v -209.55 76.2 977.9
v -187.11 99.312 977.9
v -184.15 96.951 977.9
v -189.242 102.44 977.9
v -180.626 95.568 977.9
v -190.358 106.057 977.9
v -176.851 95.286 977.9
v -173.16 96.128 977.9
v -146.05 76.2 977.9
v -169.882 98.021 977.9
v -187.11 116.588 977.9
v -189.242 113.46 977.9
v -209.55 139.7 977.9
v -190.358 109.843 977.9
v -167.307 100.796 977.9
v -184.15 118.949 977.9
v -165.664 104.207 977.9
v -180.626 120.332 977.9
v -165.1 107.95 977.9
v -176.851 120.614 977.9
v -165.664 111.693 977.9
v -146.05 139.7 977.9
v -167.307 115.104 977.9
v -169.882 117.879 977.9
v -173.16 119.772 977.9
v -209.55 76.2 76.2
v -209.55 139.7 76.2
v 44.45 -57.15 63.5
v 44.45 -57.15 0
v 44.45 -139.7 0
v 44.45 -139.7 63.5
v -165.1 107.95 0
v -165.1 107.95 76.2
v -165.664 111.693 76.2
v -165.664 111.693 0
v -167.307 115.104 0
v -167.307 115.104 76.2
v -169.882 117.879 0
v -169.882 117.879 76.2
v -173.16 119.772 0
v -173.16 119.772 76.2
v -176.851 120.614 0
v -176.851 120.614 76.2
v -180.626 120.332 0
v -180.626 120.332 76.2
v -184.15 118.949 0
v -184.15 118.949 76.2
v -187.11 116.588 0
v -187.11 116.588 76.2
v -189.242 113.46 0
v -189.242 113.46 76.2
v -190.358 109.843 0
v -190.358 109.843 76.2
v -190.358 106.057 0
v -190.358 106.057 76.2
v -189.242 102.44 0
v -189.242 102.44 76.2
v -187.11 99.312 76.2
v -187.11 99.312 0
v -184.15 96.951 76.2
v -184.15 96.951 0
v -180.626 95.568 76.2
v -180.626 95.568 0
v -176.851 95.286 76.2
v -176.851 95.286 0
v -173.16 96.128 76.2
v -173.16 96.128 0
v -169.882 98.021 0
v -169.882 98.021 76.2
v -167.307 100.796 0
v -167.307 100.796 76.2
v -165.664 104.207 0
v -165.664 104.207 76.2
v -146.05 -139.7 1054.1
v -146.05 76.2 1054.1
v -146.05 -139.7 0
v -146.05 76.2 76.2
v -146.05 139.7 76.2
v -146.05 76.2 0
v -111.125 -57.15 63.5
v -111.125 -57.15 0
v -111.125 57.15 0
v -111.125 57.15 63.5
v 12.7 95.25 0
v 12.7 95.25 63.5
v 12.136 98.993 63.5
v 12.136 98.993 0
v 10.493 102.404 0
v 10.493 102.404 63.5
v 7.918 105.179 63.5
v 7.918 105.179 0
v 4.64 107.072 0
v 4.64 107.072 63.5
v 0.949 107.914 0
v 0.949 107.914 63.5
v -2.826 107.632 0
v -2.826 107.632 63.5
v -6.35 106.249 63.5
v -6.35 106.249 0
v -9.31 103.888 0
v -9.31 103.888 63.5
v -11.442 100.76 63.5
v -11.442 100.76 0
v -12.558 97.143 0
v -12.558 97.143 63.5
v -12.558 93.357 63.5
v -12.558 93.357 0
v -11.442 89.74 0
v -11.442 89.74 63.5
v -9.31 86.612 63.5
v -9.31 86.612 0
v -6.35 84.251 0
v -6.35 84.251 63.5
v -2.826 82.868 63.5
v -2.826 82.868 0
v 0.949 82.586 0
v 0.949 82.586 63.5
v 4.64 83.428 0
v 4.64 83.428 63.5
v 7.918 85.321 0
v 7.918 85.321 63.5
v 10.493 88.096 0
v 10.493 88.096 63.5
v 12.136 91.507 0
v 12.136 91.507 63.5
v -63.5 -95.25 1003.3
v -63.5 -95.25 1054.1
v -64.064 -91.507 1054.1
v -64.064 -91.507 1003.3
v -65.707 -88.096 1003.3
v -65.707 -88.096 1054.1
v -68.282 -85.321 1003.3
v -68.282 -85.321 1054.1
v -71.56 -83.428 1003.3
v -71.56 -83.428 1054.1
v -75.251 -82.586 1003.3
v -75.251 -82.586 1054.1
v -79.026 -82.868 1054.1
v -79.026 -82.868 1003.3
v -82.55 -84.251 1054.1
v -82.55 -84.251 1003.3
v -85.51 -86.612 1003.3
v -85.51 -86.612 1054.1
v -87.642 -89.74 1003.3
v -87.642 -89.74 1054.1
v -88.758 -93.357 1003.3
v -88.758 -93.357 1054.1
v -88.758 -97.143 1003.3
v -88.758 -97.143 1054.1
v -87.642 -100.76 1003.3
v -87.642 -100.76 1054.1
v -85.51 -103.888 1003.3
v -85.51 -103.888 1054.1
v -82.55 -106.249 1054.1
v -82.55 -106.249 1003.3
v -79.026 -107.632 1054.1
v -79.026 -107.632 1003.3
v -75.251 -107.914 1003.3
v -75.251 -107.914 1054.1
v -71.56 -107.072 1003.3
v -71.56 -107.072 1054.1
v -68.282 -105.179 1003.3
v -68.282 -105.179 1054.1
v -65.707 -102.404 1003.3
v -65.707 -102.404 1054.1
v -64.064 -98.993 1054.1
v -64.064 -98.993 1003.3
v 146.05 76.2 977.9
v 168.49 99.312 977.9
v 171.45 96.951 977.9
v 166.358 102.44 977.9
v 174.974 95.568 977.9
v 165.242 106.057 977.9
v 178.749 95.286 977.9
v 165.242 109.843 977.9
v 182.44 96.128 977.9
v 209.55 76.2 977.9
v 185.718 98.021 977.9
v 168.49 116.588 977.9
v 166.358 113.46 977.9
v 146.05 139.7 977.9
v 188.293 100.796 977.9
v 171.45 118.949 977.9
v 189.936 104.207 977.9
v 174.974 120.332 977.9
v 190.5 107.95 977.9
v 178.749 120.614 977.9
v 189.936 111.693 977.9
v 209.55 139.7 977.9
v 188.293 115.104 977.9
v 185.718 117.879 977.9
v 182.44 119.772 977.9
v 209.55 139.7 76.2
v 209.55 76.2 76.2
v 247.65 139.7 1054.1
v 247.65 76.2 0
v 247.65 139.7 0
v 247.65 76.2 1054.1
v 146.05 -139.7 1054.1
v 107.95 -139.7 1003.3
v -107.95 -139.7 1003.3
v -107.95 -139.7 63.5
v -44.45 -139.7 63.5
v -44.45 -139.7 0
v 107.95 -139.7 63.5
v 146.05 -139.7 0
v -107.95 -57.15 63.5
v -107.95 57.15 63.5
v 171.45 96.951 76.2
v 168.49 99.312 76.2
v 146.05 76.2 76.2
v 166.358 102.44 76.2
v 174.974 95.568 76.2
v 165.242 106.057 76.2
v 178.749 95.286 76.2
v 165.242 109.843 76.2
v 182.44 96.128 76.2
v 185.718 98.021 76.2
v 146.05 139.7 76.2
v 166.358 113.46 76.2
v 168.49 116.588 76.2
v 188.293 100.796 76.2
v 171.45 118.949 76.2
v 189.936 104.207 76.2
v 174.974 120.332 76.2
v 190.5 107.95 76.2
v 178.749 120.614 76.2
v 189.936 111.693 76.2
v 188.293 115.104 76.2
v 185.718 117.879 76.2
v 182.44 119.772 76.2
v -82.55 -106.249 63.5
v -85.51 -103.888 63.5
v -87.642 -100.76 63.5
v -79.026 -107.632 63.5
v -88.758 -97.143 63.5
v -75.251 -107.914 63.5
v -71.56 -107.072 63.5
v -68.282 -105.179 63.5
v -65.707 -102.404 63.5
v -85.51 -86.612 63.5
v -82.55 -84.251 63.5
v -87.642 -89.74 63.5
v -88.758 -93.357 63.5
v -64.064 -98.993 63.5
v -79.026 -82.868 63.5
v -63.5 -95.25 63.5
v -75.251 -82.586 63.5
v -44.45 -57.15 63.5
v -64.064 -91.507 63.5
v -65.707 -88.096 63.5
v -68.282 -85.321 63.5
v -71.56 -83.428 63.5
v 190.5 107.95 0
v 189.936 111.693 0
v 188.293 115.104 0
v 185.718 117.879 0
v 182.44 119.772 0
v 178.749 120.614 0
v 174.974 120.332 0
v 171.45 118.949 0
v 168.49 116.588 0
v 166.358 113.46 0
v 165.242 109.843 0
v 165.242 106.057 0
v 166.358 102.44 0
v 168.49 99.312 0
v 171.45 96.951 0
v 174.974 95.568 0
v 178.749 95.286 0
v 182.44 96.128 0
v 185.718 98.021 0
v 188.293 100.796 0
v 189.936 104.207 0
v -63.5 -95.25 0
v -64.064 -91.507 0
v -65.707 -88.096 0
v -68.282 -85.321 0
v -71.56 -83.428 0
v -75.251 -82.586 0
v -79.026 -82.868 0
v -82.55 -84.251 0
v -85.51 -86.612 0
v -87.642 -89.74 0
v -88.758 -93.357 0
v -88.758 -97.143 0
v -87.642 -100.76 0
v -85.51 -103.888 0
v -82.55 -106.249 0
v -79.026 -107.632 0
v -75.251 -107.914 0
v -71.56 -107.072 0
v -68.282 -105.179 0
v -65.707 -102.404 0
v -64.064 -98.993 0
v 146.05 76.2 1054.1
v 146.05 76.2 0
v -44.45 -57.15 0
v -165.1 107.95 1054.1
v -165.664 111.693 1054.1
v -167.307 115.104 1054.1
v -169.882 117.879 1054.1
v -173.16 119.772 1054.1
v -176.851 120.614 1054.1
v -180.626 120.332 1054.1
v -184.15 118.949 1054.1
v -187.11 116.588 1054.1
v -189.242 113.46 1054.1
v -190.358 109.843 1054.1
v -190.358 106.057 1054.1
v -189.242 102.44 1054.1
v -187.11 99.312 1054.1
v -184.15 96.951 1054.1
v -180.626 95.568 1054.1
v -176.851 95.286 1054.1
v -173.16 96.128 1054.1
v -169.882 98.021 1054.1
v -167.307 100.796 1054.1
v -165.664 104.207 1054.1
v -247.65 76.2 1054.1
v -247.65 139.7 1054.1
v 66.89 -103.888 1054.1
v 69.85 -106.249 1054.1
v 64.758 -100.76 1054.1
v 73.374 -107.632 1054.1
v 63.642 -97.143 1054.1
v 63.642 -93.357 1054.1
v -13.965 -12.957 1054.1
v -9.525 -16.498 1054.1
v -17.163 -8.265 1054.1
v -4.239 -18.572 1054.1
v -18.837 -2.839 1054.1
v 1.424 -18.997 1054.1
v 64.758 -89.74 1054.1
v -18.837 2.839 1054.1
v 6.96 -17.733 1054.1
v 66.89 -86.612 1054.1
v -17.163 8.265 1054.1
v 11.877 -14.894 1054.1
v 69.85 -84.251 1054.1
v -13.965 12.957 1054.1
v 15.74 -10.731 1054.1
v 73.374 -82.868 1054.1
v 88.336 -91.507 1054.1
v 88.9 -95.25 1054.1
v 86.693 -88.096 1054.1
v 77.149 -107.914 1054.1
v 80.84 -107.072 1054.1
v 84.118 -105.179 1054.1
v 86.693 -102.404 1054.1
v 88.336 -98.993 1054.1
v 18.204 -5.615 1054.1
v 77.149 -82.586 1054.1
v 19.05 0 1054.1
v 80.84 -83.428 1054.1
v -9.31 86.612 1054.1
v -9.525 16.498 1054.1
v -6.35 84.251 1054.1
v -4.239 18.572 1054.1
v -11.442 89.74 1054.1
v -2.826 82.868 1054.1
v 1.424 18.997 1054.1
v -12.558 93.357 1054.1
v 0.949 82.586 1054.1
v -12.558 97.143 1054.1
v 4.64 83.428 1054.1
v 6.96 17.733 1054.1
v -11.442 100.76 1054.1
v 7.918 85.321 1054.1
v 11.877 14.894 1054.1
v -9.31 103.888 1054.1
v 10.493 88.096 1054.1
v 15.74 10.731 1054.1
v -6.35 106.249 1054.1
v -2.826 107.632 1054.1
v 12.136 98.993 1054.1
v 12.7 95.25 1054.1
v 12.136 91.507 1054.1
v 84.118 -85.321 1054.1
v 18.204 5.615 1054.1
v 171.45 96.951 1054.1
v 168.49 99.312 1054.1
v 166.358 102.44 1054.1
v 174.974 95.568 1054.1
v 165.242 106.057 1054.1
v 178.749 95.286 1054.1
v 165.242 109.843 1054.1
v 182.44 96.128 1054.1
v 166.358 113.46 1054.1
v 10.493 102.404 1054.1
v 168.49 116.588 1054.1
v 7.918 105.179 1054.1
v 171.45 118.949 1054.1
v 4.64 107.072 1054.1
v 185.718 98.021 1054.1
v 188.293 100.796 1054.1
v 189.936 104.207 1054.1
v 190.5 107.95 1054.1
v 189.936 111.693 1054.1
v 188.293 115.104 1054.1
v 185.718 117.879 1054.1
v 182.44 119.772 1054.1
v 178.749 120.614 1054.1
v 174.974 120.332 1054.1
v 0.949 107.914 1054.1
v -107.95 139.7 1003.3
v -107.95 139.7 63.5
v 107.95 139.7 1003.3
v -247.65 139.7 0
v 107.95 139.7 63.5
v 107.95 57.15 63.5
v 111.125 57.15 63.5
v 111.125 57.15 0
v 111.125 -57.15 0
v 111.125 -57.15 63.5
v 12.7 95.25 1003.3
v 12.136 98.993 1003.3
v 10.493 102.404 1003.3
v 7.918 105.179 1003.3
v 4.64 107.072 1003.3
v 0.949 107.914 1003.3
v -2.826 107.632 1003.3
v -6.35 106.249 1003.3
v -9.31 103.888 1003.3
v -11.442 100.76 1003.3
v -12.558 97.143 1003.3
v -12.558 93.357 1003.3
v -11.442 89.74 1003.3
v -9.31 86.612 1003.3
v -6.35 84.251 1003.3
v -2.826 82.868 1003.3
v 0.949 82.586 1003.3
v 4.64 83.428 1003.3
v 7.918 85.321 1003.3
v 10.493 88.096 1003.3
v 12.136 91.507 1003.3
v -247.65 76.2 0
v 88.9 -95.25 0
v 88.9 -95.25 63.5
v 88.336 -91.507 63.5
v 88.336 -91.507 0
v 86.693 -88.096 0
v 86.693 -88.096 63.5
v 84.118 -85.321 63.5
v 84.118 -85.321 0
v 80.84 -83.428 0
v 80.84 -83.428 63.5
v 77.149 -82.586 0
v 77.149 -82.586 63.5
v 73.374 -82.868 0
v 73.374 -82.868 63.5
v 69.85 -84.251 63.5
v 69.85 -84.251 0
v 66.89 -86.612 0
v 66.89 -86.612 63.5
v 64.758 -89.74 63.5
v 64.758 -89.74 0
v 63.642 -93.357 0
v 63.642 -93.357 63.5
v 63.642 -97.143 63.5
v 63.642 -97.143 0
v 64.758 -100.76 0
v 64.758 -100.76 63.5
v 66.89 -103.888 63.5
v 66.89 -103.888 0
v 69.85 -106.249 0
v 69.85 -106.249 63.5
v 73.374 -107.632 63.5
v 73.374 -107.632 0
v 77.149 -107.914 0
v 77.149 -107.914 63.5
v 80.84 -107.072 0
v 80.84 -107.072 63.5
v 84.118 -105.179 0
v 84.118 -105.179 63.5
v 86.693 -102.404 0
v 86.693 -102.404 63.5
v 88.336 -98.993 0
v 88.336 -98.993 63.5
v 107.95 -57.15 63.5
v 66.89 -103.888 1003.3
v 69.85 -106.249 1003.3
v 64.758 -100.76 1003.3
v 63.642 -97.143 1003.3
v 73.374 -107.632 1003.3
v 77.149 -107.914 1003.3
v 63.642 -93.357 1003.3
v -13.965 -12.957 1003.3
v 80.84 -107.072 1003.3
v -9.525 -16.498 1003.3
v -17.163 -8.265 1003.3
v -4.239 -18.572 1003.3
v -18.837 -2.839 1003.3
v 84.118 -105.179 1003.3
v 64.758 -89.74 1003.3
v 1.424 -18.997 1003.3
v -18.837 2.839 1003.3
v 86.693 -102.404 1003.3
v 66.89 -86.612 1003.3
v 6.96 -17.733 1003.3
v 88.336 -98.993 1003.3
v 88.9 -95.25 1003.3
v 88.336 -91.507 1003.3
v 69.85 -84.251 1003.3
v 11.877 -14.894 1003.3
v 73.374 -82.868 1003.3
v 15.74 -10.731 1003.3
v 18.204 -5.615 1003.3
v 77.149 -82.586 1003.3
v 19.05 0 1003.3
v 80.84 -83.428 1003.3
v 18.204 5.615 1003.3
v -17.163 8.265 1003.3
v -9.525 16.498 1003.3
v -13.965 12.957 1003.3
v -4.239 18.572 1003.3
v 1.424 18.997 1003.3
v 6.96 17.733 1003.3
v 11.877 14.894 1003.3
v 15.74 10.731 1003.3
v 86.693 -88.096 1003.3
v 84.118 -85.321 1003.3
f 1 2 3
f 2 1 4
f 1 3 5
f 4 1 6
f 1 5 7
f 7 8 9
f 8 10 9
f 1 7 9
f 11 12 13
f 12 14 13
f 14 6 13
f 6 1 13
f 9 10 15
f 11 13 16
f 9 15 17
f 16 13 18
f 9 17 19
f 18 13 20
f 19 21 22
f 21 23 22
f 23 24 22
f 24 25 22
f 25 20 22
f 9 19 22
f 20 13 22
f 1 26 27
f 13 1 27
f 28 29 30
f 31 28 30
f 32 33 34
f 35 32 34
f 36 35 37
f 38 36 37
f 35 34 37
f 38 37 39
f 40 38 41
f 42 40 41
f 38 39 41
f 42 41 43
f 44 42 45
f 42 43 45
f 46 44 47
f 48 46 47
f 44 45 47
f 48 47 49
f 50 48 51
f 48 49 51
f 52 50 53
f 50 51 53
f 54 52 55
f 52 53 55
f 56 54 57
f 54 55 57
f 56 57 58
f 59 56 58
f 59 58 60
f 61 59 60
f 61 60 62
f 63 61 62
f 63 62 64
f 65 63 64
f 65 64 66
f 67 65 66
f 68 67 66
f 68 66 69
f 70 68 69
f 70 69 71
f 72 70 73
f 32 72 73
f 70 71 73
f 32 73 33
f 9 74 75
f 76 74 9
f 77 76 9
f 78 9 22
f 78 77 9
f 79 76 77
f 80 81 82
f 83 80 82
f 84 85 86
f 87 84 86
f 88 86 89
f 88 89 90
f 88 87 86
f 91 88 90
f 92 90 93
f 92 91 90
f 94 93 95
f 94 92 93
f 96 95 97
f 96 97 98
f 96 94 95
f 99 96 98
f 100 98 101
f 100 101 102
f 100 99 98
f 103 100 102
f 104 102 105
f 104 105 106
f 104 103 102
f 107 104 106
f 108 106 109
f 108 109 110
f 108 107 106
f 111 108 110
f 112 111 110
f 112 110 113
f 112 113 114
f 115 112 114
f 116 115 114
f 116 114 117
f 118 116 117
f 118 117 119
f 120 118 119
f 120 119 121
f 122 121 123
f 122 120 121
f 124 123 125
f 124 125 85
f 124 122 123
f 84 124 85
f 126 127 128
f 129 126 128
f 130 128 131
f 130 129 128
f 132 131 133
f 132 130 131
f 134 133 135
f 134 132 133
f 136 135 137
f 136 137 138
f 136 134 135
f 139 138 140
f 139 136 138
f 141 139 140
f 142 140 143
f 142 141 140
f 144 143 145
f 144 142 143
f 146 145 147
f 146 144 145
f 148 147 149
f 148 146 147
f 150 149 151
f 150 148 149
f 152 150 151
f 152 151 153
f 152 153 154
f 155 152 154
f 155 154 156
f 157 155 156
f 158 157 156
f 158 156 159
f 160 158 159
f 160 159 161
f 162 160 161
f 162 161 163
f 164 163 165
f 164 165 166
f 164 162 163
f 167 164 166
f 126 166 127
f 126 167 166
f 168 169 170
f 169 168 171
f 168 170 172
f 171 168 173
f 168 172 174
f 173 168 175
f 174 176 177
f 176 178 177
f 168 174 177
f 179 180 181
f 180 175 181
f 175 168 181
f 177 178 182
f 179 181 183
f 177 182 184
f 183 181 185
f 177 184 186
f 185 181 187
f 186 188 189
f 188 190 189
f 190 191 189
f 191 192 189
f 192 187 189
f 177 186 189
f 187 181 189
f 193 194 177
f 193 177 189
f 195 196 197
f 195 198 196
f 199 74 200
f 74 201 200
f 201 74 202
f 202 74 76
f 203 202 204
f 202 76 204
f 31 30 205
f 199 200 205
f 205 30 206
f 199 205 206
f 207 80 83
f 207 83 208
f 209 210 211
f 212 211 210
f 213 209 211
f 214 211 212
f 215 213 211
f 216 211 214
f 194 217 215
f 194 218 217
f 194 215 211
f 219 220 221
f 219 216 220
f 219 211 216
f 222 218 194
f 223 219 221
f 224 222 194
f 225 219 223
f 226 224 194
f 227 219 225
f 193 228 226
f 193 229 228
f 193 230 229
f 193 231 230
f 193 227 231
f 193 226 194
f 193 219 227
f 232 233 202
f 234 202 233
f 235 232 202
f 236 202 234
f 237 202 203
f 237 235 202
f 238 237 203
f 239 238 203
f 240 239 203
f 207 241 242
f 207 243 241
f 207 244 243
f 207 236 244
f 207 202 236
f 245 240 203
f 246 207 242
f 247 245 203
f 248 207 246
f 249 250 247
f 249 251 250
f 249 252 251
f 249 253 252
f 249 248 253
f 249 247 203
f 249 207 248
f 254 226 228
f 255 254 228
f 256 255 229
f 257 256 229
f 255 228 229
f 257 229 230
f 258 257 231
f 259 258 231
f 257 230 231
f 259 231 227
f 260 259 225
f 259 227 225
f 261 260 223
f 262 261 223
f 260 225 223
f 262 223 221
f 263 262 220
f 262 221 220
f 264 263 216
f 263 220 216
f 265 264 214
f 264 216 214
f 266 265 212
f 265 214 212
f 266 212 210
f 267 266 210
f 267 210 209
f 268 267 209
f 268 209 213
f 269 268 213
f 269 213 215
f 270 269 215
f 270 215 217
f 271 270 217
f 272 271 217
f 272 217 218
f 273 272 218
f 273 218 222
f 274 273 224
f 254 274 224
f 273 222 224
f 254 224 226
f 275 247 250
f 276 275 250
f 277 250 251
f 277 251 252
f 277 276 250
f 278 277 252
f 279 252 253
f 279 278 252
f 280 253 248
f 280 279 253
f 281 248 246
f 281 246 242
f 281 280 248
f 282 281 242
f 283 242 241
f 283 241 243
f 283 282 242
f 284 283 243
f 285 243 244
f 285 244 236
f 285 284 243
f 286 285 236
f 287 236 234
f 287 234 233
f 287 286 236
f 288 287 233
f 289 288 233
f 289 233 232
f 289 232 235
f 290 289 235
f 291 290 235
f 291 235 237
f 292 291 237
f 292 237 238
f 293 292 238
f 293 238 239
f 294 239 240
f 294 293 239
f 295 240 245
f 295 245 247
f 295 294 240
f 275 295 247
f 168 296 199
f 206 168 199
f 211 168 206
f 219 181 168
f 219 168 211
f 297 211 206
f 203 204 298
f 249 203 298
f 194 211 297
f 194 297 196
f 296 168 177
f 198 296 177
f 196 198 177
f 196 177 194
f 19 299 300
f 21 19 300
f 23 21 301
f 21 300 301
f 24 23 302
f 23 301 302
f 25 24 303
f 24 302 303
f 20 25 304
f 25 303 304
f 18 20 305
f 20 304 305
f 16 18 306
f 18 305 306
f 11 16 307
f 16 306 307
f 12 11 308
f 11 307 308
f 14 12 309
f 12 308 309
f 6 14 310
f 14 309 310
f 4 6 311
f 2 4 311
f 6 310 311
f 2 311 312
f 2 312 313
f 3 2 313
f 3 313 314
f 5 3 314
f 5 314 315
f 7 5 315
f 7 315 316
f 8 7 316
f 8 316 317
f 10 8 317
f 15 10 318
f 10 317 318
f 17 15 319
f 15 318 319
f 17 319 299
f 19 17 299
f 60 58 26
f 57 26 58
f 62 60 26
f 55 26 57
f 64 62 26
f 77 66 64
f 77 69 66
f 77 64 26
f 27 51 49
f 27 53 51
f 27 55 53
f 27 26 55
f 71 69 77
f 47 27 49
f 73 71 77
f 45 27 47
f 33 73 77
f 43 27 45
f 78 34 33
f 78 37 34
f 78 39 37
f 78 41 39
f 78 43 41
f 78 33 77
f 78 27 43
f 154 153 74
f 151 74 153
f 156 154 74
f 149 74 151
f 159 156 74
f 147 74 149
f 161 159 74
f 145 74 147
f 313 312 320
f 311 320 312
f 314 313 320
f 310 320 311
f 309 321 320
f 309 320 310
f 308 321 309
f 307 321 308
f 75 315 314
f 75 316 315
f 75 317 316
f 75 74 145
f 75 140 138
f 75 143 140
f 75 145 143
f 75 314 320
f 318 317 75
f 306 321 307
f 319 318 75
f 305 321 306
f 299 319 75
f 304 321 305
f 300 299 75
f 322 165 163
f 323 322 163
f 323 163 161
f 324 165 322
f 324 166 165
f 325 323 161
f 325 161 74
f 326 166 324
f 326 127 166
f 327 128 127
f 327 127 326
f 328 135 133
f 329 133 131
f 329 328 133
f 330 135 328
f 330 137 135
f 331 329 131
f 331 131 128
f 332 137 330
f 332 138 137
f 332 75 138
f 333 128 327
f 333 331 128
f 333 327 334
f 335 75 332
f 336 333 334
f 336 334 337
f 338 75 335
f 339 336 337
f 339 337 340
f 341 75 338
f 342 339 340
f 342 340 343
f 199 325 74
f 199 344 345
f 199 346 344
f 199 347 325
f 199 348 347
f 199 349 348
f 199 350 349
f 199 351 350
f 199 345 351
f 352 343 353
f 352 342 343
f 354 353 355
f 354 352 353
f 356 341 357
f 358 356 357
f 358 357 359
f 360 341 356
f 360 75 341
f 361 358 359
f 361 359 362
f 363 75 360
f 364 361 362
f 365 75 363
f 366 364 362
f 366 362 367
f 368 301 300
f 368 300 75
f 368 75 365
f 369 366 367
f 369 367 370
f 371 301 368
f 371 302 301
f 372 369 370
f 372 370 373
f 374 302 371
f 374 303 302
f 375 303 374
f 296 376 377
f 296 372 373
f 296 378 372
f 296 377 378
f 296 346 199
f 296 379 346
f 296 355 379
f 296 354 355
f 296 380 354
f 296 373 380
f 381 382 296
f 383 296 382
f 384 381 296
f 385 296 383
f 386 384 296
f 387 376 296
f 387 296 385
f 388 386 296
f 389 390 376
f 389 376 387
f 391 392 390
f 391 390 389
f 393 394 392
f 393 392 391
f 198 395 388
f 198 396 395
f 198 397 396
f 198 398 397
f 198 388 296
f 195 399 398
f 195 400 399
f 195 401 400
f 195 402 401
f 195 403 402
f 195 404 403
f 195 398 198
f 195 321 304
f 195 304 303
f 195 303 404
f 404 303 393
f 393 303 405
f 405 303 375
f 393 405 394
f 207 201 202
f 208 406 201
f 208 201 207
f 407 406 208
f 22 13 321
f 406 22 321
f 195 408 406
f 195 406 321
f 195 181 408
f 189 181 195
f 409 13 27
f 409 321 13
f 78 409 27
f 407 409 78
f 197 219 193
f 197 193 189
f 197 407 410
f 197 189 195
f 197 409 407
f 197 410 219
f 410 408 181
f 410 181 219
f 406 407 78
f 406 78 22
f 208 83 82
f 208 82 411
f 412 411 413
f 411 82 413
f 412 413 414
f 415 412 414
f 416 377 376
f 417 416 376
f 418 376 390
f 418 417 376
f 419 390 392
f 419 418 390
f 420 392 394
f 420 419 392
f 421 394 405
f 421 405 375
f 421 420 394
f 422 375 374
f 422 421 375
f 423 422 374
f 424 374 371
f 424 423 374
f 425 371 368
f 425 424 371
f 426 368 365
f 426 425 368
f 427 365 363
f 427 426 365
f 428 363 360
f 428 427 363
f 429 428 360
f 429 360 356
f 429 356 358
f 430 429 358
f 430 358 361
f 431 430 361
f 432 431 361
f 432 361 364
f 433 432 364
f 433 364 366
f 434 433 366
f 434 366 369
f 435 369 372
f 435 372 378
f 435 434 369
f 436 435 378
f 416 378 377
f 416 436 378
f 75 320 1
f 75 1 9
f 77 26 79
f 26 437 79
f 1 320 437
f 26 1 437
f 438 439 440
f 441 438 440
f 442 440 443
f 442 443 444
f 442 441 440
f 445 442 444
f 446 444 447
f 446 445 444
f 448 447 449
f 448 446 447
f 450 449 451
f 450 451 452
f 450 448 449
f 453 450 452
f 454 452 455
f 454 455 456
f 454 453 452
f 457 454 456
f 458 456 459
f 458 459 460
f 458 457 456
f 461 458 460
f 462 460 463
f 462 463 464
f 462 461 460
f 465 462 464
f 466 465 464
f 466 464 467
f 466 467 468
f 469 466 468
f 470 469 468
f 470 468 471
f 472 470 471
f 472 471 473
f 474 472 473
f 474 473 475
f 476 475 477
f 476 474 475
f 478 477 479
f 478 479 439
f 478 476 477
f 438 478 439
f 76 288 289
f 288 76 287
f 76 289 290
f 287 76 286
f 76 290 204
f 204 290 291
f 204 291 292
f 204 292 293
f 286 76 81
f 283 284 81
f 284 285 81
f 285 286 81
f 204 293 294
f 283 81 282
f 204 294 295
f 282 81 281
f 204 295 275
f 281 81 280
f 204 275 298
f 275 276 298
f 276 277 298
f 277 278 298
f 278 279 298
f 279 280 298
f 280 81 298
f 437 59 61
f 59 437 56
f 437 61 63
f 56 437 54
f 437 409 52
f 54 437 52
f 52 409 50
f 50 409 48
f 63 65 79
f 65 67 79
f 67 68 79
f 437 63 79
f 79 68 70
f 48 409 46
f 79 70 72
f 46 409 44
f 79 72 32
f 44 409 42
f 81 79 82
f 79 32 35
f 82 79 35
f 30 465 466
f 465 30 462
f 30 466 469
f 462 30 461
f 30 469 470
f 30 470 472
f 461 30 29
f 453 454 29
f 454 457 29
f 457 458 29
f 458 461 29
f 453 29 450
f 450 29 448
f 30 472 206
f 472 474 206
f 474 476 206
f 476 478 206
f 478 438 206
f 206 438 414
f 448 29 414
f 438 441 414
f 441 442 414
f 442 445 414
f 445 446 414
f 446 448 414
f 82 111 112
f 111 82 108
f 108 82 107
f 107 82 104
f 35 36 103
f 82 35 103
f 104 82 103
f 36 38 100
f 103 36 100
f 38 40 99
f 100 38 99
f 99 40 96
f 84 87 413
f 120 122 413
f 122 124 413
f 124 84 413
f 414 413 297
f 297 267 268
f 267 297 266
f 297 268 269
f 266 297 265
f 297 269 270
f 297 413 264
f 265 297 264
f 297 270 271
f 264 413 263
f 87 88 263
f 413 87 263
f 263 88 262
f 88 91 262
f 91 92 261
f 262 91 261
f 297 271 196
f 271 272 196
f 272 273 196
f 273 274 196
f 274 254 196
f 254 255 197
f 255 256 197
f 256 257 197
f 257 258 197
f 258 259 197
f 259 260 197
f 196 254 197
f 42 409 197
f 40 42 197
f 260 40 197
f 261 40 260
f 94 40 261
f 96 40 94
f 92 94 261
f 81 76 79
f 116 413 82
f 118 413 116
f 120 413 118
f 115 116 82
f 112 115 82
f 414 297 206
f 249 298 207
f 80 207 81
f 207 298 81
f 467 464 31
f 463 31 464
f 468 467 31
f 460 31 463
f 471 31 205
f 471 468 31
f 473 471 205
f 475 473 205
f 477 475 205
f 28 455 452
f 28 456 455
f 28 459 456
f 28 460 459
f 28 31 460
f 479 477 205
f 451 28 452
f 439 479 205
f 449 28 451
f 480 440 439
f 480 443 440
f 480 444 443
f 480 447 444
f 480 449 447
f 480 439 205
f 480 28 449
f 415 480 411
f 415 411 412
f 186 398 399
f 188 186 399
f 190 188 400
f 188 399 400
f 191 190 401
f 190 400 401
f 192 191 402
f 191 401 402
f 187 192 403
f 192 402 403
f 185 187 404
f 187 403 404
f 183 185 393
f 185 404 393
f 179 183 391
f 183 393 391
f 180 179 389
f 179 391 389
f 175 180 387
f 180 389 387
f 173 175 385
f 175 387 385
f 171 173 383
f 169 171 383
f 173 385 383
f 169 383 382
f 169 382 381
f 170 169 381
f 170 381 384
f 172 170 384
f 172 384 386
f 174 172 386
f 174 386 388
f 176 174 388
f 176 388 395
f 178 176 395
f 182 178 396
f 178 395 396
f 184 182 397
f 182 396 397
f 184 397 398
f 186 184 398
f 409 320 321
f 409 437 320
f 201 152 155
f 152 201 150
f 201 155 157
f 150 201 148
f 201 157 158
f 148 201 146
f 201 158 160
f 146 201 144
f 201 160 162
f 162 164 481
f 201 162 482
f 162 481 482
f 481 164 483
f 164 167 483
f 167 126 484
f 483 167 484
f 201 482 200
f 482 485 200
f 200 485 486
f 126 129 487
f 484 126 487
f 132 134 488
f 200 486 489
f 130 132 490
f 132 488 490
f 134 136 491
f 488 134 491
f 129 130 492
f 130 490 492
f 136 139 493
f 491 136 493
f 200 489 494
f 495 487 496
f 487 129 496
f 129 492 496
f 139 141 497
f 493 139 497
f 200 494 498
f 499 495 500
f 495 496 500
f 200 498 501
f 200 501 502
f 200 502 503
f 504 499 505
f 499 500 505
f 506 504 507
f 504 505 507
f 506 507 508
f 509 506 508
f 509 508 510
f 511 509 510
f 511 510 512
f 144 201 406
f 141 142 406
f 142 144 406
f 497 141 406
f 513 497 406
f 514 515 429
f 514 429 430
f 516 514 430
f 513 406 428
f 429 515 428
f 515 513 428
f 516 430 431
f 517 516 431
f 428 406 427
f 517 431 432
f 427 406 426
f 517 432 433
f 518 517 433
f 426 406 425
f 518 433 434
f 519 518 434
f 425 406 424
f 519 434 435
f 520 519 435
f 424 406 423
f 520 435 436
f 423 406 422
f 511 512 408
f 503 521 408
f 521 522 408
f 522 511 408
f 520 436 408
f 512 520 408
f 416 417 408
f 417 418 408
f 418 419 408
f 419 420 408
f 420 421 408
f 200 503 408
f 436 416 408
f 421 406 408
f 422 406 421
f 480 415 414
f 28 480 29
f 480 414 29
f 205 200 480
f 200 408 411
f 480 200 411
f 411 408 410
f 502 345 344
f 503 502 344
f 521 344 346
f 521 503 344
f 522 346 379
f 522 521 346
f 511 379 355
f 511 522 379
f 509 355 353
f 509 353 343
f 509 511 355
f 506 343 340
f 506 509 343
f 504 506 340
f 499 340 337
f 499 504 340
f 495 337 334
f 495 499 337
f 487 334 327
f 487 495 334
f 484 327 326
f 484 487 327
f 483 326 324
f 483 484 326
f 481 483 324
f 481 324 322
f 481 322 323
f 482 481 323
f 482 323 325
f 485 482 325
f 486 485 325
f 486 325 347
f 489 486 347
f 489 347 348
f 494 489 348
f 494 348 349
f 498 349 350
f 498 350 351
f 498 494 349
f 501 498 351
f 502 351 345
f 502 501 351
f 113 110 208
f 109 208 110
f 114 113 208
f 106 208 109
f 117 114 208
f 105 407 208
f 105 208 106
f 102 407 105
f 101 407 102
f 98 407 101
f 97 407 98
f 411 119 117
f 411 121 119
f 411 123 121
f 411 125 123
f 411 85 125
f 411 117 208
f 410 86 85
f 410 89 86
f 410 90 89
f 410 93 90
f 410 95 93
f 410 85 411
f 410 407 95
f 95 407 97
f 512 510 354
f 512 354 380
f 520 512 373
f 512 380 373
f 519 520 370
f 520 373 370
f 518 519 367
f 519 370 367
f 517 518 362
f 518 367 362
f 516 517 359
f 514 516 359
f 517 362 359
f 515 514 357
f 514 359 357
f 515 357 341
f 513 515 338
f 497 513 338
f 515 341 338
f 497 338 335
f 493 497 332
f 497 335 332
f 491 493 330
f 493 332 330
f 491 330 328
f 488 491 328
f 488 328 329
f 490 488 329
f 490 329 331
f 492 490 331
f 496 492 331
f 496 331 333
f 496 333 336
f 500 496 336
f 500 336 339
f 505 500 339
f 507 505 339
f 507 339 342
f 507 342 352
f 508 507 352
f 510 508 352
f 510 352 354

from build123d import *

# Parameters (mm, degrees)
SKETCH1_R           = 12.7
BOSS_EXTRUDE1_DEPTH = 63.5
BOSS_EXTRUDE2_REACH = 323.601
SKETCH2_W           = 38.1
SKETCH2_H           = 939.8
SKETCH3_W           = 38.1
SKETCH3_H           = 279.4
SKETCH3_W_2         = 215.9
SKETCH3_R           = 12.7
BOSS_EXTRUDE3_DEPTH = 50.8
CUT_EXTRUDE1_REACH  = 1075.3
SKETCH4_R           = 19.05
SKETCH5_W           = 38.1
SKETCH5_H           = 63.5
SKETCH5_W_2         = 63.5
SKETCH5_R           = 12.7
BOSS_EXTRUDE4_DEPTH = 76.2
BOSS_EXTRUDE5_START = -977.9
SKETCH5_3_W         = 38.1
SKETCH5_3_H         = 63.5
SKETCH5_3_W_2       = 63.5
SKETCH5_3_R         = 12.7
BOSS_EXTRUDE5_DEPTH = 76.2
BOSS_EXTRUDE6_START = -977.9
SKETCH5_4_W         = 38.1
SKETCH5_4_H         = 63.5
BOSS_EXTRUDE6_DEPTH = 901.7


with BuildPart() as part:
    # Sketch1 → Boss-Extrude1 (new body)
    with BuildSketch(Plane.XY):
        Polygon((146.05, 139.7), (-146.05, 139.7), (-146.05, -139.7), (-44.45, -139.7), (-44.45, -57.15), (-111.125, -57.15), (-111.125, 57.15), (111.125, 57.15), (111.125, -57.15), (44.45, -57.15), (44.45, -139.7), (146.05, -139.7), align=None)
        with Locations((-76.2, -95.25)):
            Circle(SKETCH1_R, mode=Mode.SUBTRACT)
        with Locations((76.2, -95.25)):
            Circle(SKETCH1_R, mode=Mode.SUBTRACT)
        with Locations((0, 95.25)):
            Circle(SKETCH1_R, mode=Mode.SUBTRACT)
    extrude(amount=BOSS_EXTRUDE1_DEPTH)

    # Boss-Extrude2: up to this face of the body (flat: up to its plane)
    boss_extrude2_end = Plane(part.part.faces().sort_by_distance((-95.25, -139.7, 31.75))[0])
    # Sketch2 → Boss-Extrude2 (add, up to the picked face)
    with BuildSketch(Plane(origin=(0, 139.7, 0), x_dir=(1, 0, 0), z_dir=(0, 1, 0)), mode=Mode.PRIVATE) as boss_extrude2_sk1:
        with Locations((-127, -533.4)):
            Rectangle(SKETCH2_W, SKETCH2_H)
    boss_extrude2_tool1 = split(extrude(boss_extrude2_sk1.sketch, amount=-BOSS_EXTRUDE2_REACH, mode=Mode.PRIVATE), bisect_by=boss_extrude2_end, keep=Keep.BOTH, mode=Mode.PRIVATE)
    # Sketch2 → Boss-Extrude2 (add, up to the picked face)
    with BuildSketch(Plane(origin=(0, 139.7, 0), x_dir=(1, 0, 0), z_dir=(0, 1, 0)), mode=Mode.PRIVATE) as boss_extrude2_sk2:
        with Locations((127, -533.4)):
            Rectangle(SKETCH2_W, SKETCH2_H)
    boss_extrude2_tool2 = split(extrude(boss_extrude2_sk2.sketch, amount=-BOSS_EXTRUDE2_REACH, mode=Mode.PRIVATE), bisect_by=boss_extrude2_end, keep=Keep.BOTH, mode=Mode.PRIVATE)
    add(boss_extrude2_tool1.solids().sort_by(Axis((-127, 139.7, 533.4), (0, -1, 0)))[0])
    add(boss_extrude2_tool2.solids().sort_by(Axis((127, 139.7, 533.4), (0, -1, 0)))[0])

    # Sketch3 → Boss-Extrude3 (add)
    # profile 1 of 3: a face of its own
    with BuildSketch(Plane.XY.offset(1003.3)):
        with Locations((-127, 0)):
            Rectangle(SKETCH3_W, SKETCH3_H)
    # profile 2 of 3: a face of its own
    with BuildSketch(Plane.XY.offset(1003.3)):
        Rectangle(SKETCH3_W_2, SKETCH3_H)
        with Locations((-76.2, -95.25)):
            Circle(SKETCH3_R, mode=Mode.SUBTRACT)
        with Locations((76.2, -95.25)):
            Circle(SKETCH3_R, mode=Mode.SUBTRACT)
        with Locations((0, 95.25)):
            Circle(SKETCH3_R, mode=Mode.SUBTRACT)
    # profile 3 of 3: a face of its own
    with BuildSketch(Plane.XY.offset(1003.3)):
        with Locations((127, 0)):
            Rectangle(SKETCH3_W, SKETCH3_H)
    extrude(amount=BOSS_EXTRUDE3_DEPTH)

    # Sketch4 → Cut-Extrude1 (cut, up to next)
    with BuildSketch(Plane.XY.offset(1054.1), mode=Mode.PRIVATE) as cut_extrude1_sk1:
        Circle(SKETCH4_R)
    cut_extrude1_tool1 = extrude(cut_extrude1_sk1.sketch, amount=-CUT_EXTRUDE1_REACH, mode=Mode.PRIVATE) & part.part
    add(cut_extrude1_tool1.solids().sort_by_distance((0, 0, 1054.1))[0], mode=Mode.SUBTRACT)

    # Sketch5 → Boss-Extrude4 (add)
    # profile 1 of 4: a face of its own
    with BuildSketch(Plane.XY.offset(1054.1)):
        with Locations((228.6, 107.95)):
            Rectangle(SKETCH5_W, SKETCH5_H)
    # profile 2 of 4: a face of its own
    with BuildSketch(Plane.XY.offset(1054.1)):
        with Locations((177.8, 107.95)):
            Rectangle(SKETCH5_W_2, SKETCH5_H)
        with Locations((177.8, 107.95)):
            Circle(SKETCH5_R, mode=Mode.SUBTRACT)
    # profile 3 of 4: a face of its own
    with BuildSketch(Plane.XY.offset(1054.1)):
        with Locations((-228.6, 107.95)):
            Rectangle(SKETCH5_W, SKETCH5_H)
    # profile 4 of 4: a face of its own
    with BuildSketch(Plane.XY.offset(1054.1)):
        with Locations((-177.8, 107.95)):
            Rectangle(SKETCH5_W_2, SKETCH5_H)
        with Locations((-177.8, 107.95)):
            Circle(SKETCH5_R, mode=Mode.SUBTRACT)
    extrude(amount=-BOSS_EXTRUDE4_DEPTH)

    # Sketch5<3> → Boss-Extrude5 (add)
    # profile 1 of 4: a face of its own
    with BuildSketch(Plane.XY.offset(1054.1).offset(BOSS_EXTRUDE5_START)):
        with Locations((228.6, 107.95)):
            Rectangle(SKETCH5_3_W, SKETCH5_3_H)
    # profile 2 of 4: a face of its own
    with BuildSketch(Plane.XY.offset(1054.1).offset(BOSS_EXTRUDE5_START)):
        with Locations((177.8, 107.95)):
            Rectangle(SKETCH5_3_W_2, SKETCH5_3_H)
        with Locations((177.8, 107.95)):
            Circle(SKETCH5_3_R, mode=Mode.SUBTRACT)
    # profile 3 of 4: a face of its own
    with BuildSketch(Plane.XY.offset(1054.1).offset(BOSS_EXTRUDE5_START)):
        with Locations((-228.6, 107.95)):
            Rectangle(SKETCH5_3_W, SKETCH5_3_H)
    # profile 4 of 4: a face of its own
    with BuildSketch(Plane.XY.offset(1054.1).offset(BOSS_EXTRUDE5_START)):
        with Locations((-177.8, 107.95)):
            Rectangle(SKETCH5_3_W_2, SKETCH5_3_H)
        with Locations((-177.8, 107.95)):
            Circle(SKETCH5_3_R, mode=Mode.SUBTRACT)
    extrude(amount=-BOSS_EXTRUDE5_DEPTH)

    # Sketch5<4> → Boss-Extrude6 (add)
    with BuildSketch(Plane.XY.offset(1054.1).offset(BOSS_EXTRUDE6_START)):
        with Locations((-228.6, 107.95)):
            Rectangle(SKETCH5_4_W, SKETCH5_4_H)
        with Locations((228.6, 107.95)):
            Rectangle(SKETCH5_4_W, SKETCH5_4_H)
    extrude(amount=BOSS_EXTRUDE6_DEPTH)


solid = part.part
